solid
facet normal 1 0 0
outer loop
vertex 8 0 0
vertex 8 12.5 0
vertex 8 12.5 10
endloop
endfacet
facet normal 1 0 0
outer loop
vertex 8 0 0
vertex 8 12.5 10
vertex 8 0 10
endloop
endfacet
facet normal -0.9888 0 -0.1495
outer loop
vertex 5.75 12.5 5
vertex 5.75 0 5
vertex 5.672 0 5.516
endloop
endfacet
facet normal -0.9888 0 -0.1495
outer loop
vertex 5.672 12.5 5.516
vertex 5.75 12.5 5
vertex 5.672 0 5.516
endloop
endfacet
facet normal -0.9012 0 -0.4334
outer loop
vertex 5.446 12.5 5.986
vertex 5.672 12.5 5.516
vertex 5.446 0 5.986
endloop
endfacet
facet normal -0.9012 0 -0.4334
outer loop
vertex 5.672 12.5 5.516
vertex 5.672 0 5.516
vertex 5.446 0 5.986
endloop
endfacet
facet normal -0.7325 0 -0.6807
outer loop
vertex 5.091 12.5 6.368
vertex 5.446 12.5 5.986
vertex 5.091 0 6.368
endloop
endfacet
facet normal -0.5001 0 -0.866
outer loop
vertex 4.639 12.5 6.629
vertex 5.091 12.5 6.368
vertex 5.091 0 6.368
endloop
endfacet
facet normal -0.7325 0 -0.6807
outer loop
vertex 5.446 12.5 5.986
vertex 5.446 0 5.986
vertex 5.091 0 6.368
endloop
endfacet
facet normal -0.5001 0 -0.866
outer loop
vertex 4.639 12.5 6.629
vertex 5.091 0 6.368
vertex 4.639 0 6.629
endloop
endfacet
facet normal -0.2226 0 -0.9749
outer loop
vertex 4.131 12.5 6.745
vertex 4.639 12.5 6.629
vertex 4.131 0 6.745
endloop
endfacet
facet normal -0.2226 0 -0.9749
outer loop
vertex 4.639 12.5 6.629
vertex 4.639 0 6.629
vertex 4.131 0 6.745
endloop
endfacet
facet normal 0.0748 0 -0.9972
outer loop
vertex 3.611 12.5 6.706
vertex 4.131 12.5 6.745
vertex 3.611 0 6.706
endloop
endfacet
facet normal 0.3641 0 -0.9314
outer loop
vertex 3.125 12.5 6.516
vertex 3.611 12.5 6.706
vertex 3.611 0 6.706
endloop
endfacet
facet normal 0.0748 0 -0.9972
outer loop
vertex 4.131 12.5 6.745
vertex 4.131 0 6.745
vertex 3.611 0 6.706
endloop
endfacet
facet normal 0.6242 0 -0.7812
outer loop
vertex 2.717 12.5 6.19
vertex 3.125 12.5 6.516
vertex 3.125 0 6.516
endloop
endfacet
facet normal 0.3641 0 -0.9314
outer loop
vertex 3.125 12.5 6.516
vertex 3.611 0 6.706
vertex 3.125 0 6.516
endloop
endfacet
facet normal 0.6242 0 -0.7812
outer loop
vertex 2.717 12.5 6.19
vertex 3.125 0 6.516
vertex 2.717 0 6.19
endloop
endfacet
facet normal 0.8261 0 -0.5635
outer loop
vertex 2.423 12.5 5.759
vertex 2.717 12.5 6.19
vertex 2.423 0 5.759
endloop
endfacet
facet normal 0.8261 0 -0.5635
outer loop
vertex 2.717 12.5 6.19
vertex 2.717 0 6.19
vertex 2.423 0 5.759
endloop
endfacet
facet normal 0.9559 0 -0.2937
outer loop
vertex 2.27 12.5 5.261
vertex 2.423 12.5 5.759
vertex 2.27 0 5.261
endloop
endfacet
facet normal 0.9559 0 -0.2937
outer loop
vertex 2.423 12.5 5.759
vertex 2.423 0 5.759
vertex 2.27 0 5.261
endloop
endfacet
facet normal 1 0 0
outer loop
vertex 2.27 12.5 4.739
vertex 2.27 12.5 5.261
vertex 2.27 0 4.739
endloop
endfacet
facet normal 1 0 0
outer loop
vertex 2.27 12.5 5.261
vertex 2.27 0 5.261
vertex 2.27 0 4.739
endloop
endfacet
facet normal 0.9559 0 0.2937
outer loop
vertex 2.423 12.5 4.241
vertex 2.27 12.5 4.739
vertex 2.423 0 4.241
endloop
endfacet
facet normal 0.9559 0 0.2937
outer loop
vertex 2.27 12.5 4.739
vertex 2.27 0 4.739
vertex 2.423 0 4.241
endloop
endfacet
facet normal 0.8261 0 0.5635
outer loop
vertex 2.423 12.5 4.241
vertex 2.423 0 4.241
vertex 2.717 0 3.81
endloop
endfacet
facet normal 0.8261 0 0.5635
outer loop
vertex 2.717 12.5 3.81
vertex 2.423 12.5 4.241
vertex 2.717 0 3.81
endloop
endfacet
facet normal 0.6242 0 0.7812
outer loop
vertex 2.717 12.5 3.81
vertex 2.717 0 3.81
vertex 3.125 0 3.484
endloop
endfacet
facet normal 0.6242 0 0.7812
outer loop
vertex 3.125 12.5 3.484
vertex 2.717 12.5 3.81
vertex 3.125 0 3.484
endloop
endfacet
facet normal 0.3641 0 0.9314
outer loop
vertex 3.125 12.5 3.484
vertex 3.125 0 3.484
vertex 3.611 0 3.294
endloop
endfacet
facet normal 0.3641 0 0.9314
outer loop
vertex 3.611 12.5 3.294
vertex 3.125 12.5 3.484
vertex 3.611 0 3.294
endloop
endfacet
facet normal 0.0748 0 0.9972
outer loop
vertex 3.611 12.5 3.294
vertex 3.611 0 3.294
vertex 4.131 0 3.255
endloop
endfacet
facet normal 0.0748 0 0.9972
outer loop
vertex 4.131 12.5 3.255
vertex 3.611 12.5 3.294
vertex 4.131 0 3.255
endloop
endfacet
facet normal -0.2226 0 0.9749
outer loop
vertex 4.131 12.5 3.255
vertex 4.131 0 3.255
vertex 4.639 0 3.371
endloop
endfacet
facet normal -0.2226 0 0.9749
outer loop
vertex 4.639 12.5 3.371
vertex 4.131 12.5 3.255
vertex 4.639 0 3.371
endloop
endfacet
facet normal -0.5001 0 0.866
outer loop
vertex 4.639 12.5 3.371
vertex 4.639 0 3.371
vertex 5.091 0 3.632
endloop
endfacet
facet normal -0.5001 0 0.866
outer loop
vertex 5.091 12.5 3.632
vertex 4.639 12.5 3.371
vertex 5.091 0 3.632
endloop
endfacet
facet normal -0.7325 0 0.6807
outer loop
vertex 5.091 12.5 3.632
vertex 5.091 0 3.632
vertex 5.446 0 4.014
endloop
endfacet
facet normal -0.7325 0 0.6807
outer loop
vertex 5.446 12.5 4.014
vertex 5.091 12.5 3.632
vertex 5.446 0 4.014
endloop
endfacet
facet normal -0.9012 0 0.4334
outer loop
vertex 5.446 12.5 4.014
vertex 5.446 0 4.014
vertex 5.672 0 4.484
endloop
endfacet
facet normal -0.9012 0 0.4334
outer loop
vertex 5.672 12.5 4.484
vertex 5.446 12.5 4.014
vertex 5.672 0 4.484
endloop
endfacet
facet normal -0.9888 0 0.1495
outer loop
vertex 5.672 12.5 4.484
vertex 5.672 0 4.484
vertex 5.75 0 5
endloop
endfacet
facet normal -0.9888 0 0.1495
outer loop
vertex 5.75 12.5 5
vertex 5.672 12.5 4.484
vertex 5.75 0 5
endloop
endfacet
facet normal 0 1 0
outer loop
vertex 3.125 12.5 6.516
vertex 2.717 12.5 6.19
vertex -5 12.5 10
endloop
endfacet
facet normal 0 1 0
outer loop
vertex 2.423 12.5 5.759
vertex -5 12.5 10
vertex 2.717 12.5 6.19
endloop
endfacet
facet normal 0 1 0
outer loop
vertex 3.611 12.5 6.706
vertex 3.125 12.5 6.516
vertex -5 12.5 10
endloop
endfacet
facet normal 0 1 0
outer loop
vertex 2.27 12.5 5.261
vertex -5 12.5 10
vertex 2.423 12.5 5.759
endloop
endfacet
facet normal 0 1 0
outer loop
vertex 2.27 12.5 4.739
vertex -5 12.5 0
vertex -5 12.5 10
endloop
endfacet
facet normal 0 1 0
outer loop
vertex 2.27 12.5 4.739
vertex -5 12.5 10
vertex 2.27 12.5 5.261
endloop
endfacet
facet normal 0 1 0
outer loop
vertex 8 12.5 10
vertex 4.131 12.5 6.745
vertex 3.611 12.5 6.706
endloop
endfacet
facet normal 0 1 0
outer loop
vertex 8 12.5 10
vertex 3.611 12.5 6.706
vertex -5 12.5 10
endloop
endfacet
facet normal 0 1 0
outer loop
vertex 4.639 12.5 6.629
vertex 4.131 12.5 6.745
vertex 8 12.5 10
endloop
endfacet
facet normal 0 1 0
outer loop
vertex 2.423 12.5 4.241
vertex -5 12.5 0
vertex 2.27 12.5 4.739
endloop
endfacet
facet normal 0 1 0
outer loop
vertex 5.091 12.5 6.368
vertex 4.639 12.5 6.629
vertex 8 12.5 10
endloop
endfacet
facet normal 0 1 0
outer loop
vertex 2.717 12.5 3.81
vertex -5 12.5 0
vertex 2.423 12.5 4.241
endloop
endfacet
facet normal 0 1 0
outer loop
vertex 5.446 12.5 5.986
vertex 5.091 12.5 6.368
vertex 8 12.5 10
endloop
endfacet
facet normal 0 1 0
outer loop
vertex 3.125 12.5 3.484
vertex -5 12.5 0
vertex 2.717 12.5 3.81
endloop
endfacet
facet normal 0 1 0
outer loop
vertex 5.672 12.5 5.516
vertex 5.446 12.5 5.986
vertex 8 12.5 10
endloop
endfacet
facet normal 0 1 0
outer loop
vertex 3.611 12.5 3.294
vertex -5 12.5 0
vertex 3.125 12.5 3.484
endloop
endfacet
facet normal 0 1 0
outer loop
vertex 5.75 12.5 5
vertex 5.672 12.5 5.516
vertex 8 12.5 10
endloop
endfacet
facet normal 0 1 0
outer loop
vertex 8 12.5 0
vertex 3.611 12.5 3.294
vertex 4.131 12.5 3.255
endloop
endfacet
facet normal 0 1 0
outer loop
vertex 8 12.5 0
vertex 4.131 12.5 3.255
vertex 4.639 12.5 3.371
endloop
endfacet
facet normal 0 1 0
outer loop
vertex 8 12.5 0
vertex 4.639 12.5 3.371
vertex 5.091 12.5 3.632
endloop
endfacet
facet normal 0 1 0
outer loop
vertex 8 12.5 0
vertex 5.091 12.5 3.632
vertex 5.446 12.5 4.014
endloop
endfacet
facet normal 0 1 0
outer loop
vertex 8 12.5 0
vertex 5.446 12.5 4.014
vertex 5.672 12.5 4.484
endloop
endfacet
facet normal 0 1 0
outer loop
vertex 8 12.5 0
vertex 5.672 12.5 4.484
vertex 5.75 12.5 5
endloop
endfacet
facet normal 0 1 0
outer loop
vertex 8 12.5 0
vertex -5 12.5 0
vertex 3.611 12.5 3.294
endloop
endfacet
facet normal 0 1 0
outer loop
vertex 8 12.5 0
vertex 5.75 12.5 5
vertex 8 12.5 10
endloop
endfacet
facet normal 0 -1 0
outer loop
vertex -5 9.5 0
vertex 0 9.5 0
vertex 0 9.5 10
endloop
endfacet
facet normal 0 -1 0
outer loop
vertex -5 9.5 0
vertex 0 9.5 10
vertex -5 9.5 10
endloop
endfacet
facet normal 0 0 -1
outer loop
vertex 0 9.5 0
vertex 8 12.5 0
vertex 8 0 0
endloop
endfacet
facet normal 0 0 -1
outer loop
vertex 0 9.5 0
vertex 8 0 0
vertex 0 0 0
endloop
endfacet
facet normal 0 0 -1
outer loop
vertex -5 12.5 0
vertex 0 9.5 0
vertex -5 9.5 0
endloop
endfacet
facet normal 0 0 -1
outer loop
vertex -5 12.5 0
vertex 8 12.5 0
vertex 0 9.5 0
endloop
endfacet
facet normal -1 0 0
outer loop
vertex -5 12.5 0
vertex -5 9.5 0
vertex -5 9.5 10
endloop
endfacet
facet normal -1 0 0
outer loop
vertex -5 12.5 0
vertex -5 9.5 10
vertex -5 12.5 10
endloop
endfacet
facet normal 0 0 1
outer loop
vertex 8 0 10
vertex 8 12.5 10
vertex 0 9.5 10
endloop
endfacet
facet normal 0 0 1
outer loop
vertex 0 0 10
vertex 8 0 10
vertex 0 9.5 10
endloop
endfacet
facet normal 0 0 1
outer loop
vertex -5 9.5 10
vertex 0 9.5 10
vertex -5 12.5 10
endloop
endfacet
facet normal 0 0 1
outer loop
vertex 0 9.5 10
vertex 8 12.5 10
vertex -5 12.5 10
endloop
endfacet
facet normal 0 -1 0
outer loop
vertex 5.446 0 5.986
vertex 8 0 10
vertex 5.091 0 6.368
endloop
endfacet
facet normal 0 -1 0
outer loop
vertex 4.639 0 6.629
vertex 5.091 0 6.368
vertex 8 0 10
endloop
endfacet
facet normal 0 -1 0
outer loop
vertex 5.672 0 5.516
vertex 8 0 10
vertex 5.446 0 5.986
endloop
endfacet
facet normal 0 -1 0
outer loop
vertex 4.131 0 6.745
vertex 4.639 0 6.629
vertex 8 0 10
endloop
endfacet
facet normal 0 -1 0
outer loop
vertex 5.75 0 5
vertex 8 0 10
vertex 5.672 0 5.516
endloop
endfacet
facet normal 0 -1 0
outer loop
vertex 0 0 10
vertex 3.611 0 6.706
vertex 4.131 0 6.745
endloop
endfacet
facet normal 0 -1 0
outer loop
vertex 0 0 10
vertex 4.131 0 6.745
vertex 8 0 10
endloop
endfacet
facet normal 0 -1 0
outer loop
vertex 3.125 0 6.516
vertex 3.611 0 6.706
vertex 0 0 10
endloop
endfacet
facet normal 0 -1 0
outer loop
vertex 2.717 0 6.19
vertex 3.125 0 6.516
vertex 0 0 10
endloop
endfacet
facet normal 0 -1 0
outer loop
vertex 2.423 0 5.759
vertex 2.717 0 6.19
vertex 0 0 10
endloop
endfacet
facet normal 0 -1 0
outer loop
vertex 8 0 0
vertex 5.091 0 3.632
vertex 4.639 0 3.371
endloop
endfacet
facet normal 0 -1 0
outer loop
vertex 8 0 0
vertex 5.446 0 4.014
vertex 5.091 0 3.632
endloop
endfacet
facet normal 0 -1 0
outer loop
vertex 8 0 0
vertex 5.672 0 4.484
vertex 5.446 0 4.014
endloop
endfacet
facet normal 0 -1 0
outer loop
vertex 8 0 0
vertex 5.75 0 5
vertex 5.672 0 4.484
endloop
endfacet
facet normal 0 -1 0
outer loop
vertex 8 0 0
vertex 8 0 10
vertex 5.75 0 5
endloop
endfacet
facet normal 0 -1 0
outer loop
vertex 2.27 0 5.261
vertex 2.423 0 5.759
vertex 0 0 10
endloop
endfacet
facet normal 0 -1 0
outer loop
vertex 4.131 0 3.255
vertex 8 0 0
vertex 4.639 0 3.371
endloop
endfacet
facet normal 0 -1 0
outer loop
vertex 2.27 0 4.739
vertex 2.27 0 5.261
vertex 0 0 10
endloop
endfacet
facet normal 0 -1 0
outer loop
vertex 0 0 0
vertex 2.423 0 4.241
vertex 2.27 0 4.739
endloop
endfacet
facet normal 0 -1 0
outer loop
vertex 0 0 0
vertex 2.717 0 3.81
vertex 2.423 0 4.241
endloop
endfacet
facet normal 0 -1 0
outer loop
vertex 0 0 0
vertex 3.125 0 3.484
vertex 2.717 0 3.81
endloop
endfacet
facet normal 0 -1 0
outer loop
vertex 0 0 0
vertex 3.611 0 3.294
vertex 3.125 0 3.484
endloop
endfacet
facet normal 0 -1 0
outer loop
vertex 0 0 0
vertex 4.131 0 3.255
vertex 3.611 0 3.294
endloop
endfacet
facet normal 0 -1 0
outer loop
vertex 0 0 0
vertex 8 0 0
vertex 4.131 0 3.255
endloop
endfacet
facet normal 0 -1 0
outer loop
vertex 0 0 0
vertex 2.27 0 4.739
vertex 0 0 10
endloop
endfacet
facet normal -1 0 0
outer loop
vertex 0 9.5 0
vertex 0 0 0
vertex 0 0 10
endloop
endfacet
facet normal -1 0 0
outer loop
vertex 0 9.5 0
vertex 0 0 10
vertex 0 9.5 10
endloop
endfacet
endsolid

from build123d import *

# Parameters (mm, degrees)
EXTRUDE_1_DEPTH     = 10
SKETCH_2_R          = 1.75
CUT_EXTRUDE_1_DEPTH = 13.5


with BuildPart() as part:
    # ｽｹｯﾁ1 → ﾎﾞｽ - 押し出し1 (new body)
    with BuildSketch(Plane.XY):
        Polygon((0, 0), (0, 9.5), (-5, 9.5), (-5, 12.5), (8, 12.5), (8, 0), align=None)
    extrude(amount=EXTRUDE_1_DEPTH)

    # ｽｹｯﾁ2 → ｶｯﾄ - 押し出し1 (cut, through all)
    with BuildSketch(Plane.XZ):
        with Locations((4, 5)):
            Circle(SKETCH_2_R)
    extrude(amount=-CUT_EXTRUDE_1_DEPTH, mode=Mode.SUBTRACT)


solid = part.part
